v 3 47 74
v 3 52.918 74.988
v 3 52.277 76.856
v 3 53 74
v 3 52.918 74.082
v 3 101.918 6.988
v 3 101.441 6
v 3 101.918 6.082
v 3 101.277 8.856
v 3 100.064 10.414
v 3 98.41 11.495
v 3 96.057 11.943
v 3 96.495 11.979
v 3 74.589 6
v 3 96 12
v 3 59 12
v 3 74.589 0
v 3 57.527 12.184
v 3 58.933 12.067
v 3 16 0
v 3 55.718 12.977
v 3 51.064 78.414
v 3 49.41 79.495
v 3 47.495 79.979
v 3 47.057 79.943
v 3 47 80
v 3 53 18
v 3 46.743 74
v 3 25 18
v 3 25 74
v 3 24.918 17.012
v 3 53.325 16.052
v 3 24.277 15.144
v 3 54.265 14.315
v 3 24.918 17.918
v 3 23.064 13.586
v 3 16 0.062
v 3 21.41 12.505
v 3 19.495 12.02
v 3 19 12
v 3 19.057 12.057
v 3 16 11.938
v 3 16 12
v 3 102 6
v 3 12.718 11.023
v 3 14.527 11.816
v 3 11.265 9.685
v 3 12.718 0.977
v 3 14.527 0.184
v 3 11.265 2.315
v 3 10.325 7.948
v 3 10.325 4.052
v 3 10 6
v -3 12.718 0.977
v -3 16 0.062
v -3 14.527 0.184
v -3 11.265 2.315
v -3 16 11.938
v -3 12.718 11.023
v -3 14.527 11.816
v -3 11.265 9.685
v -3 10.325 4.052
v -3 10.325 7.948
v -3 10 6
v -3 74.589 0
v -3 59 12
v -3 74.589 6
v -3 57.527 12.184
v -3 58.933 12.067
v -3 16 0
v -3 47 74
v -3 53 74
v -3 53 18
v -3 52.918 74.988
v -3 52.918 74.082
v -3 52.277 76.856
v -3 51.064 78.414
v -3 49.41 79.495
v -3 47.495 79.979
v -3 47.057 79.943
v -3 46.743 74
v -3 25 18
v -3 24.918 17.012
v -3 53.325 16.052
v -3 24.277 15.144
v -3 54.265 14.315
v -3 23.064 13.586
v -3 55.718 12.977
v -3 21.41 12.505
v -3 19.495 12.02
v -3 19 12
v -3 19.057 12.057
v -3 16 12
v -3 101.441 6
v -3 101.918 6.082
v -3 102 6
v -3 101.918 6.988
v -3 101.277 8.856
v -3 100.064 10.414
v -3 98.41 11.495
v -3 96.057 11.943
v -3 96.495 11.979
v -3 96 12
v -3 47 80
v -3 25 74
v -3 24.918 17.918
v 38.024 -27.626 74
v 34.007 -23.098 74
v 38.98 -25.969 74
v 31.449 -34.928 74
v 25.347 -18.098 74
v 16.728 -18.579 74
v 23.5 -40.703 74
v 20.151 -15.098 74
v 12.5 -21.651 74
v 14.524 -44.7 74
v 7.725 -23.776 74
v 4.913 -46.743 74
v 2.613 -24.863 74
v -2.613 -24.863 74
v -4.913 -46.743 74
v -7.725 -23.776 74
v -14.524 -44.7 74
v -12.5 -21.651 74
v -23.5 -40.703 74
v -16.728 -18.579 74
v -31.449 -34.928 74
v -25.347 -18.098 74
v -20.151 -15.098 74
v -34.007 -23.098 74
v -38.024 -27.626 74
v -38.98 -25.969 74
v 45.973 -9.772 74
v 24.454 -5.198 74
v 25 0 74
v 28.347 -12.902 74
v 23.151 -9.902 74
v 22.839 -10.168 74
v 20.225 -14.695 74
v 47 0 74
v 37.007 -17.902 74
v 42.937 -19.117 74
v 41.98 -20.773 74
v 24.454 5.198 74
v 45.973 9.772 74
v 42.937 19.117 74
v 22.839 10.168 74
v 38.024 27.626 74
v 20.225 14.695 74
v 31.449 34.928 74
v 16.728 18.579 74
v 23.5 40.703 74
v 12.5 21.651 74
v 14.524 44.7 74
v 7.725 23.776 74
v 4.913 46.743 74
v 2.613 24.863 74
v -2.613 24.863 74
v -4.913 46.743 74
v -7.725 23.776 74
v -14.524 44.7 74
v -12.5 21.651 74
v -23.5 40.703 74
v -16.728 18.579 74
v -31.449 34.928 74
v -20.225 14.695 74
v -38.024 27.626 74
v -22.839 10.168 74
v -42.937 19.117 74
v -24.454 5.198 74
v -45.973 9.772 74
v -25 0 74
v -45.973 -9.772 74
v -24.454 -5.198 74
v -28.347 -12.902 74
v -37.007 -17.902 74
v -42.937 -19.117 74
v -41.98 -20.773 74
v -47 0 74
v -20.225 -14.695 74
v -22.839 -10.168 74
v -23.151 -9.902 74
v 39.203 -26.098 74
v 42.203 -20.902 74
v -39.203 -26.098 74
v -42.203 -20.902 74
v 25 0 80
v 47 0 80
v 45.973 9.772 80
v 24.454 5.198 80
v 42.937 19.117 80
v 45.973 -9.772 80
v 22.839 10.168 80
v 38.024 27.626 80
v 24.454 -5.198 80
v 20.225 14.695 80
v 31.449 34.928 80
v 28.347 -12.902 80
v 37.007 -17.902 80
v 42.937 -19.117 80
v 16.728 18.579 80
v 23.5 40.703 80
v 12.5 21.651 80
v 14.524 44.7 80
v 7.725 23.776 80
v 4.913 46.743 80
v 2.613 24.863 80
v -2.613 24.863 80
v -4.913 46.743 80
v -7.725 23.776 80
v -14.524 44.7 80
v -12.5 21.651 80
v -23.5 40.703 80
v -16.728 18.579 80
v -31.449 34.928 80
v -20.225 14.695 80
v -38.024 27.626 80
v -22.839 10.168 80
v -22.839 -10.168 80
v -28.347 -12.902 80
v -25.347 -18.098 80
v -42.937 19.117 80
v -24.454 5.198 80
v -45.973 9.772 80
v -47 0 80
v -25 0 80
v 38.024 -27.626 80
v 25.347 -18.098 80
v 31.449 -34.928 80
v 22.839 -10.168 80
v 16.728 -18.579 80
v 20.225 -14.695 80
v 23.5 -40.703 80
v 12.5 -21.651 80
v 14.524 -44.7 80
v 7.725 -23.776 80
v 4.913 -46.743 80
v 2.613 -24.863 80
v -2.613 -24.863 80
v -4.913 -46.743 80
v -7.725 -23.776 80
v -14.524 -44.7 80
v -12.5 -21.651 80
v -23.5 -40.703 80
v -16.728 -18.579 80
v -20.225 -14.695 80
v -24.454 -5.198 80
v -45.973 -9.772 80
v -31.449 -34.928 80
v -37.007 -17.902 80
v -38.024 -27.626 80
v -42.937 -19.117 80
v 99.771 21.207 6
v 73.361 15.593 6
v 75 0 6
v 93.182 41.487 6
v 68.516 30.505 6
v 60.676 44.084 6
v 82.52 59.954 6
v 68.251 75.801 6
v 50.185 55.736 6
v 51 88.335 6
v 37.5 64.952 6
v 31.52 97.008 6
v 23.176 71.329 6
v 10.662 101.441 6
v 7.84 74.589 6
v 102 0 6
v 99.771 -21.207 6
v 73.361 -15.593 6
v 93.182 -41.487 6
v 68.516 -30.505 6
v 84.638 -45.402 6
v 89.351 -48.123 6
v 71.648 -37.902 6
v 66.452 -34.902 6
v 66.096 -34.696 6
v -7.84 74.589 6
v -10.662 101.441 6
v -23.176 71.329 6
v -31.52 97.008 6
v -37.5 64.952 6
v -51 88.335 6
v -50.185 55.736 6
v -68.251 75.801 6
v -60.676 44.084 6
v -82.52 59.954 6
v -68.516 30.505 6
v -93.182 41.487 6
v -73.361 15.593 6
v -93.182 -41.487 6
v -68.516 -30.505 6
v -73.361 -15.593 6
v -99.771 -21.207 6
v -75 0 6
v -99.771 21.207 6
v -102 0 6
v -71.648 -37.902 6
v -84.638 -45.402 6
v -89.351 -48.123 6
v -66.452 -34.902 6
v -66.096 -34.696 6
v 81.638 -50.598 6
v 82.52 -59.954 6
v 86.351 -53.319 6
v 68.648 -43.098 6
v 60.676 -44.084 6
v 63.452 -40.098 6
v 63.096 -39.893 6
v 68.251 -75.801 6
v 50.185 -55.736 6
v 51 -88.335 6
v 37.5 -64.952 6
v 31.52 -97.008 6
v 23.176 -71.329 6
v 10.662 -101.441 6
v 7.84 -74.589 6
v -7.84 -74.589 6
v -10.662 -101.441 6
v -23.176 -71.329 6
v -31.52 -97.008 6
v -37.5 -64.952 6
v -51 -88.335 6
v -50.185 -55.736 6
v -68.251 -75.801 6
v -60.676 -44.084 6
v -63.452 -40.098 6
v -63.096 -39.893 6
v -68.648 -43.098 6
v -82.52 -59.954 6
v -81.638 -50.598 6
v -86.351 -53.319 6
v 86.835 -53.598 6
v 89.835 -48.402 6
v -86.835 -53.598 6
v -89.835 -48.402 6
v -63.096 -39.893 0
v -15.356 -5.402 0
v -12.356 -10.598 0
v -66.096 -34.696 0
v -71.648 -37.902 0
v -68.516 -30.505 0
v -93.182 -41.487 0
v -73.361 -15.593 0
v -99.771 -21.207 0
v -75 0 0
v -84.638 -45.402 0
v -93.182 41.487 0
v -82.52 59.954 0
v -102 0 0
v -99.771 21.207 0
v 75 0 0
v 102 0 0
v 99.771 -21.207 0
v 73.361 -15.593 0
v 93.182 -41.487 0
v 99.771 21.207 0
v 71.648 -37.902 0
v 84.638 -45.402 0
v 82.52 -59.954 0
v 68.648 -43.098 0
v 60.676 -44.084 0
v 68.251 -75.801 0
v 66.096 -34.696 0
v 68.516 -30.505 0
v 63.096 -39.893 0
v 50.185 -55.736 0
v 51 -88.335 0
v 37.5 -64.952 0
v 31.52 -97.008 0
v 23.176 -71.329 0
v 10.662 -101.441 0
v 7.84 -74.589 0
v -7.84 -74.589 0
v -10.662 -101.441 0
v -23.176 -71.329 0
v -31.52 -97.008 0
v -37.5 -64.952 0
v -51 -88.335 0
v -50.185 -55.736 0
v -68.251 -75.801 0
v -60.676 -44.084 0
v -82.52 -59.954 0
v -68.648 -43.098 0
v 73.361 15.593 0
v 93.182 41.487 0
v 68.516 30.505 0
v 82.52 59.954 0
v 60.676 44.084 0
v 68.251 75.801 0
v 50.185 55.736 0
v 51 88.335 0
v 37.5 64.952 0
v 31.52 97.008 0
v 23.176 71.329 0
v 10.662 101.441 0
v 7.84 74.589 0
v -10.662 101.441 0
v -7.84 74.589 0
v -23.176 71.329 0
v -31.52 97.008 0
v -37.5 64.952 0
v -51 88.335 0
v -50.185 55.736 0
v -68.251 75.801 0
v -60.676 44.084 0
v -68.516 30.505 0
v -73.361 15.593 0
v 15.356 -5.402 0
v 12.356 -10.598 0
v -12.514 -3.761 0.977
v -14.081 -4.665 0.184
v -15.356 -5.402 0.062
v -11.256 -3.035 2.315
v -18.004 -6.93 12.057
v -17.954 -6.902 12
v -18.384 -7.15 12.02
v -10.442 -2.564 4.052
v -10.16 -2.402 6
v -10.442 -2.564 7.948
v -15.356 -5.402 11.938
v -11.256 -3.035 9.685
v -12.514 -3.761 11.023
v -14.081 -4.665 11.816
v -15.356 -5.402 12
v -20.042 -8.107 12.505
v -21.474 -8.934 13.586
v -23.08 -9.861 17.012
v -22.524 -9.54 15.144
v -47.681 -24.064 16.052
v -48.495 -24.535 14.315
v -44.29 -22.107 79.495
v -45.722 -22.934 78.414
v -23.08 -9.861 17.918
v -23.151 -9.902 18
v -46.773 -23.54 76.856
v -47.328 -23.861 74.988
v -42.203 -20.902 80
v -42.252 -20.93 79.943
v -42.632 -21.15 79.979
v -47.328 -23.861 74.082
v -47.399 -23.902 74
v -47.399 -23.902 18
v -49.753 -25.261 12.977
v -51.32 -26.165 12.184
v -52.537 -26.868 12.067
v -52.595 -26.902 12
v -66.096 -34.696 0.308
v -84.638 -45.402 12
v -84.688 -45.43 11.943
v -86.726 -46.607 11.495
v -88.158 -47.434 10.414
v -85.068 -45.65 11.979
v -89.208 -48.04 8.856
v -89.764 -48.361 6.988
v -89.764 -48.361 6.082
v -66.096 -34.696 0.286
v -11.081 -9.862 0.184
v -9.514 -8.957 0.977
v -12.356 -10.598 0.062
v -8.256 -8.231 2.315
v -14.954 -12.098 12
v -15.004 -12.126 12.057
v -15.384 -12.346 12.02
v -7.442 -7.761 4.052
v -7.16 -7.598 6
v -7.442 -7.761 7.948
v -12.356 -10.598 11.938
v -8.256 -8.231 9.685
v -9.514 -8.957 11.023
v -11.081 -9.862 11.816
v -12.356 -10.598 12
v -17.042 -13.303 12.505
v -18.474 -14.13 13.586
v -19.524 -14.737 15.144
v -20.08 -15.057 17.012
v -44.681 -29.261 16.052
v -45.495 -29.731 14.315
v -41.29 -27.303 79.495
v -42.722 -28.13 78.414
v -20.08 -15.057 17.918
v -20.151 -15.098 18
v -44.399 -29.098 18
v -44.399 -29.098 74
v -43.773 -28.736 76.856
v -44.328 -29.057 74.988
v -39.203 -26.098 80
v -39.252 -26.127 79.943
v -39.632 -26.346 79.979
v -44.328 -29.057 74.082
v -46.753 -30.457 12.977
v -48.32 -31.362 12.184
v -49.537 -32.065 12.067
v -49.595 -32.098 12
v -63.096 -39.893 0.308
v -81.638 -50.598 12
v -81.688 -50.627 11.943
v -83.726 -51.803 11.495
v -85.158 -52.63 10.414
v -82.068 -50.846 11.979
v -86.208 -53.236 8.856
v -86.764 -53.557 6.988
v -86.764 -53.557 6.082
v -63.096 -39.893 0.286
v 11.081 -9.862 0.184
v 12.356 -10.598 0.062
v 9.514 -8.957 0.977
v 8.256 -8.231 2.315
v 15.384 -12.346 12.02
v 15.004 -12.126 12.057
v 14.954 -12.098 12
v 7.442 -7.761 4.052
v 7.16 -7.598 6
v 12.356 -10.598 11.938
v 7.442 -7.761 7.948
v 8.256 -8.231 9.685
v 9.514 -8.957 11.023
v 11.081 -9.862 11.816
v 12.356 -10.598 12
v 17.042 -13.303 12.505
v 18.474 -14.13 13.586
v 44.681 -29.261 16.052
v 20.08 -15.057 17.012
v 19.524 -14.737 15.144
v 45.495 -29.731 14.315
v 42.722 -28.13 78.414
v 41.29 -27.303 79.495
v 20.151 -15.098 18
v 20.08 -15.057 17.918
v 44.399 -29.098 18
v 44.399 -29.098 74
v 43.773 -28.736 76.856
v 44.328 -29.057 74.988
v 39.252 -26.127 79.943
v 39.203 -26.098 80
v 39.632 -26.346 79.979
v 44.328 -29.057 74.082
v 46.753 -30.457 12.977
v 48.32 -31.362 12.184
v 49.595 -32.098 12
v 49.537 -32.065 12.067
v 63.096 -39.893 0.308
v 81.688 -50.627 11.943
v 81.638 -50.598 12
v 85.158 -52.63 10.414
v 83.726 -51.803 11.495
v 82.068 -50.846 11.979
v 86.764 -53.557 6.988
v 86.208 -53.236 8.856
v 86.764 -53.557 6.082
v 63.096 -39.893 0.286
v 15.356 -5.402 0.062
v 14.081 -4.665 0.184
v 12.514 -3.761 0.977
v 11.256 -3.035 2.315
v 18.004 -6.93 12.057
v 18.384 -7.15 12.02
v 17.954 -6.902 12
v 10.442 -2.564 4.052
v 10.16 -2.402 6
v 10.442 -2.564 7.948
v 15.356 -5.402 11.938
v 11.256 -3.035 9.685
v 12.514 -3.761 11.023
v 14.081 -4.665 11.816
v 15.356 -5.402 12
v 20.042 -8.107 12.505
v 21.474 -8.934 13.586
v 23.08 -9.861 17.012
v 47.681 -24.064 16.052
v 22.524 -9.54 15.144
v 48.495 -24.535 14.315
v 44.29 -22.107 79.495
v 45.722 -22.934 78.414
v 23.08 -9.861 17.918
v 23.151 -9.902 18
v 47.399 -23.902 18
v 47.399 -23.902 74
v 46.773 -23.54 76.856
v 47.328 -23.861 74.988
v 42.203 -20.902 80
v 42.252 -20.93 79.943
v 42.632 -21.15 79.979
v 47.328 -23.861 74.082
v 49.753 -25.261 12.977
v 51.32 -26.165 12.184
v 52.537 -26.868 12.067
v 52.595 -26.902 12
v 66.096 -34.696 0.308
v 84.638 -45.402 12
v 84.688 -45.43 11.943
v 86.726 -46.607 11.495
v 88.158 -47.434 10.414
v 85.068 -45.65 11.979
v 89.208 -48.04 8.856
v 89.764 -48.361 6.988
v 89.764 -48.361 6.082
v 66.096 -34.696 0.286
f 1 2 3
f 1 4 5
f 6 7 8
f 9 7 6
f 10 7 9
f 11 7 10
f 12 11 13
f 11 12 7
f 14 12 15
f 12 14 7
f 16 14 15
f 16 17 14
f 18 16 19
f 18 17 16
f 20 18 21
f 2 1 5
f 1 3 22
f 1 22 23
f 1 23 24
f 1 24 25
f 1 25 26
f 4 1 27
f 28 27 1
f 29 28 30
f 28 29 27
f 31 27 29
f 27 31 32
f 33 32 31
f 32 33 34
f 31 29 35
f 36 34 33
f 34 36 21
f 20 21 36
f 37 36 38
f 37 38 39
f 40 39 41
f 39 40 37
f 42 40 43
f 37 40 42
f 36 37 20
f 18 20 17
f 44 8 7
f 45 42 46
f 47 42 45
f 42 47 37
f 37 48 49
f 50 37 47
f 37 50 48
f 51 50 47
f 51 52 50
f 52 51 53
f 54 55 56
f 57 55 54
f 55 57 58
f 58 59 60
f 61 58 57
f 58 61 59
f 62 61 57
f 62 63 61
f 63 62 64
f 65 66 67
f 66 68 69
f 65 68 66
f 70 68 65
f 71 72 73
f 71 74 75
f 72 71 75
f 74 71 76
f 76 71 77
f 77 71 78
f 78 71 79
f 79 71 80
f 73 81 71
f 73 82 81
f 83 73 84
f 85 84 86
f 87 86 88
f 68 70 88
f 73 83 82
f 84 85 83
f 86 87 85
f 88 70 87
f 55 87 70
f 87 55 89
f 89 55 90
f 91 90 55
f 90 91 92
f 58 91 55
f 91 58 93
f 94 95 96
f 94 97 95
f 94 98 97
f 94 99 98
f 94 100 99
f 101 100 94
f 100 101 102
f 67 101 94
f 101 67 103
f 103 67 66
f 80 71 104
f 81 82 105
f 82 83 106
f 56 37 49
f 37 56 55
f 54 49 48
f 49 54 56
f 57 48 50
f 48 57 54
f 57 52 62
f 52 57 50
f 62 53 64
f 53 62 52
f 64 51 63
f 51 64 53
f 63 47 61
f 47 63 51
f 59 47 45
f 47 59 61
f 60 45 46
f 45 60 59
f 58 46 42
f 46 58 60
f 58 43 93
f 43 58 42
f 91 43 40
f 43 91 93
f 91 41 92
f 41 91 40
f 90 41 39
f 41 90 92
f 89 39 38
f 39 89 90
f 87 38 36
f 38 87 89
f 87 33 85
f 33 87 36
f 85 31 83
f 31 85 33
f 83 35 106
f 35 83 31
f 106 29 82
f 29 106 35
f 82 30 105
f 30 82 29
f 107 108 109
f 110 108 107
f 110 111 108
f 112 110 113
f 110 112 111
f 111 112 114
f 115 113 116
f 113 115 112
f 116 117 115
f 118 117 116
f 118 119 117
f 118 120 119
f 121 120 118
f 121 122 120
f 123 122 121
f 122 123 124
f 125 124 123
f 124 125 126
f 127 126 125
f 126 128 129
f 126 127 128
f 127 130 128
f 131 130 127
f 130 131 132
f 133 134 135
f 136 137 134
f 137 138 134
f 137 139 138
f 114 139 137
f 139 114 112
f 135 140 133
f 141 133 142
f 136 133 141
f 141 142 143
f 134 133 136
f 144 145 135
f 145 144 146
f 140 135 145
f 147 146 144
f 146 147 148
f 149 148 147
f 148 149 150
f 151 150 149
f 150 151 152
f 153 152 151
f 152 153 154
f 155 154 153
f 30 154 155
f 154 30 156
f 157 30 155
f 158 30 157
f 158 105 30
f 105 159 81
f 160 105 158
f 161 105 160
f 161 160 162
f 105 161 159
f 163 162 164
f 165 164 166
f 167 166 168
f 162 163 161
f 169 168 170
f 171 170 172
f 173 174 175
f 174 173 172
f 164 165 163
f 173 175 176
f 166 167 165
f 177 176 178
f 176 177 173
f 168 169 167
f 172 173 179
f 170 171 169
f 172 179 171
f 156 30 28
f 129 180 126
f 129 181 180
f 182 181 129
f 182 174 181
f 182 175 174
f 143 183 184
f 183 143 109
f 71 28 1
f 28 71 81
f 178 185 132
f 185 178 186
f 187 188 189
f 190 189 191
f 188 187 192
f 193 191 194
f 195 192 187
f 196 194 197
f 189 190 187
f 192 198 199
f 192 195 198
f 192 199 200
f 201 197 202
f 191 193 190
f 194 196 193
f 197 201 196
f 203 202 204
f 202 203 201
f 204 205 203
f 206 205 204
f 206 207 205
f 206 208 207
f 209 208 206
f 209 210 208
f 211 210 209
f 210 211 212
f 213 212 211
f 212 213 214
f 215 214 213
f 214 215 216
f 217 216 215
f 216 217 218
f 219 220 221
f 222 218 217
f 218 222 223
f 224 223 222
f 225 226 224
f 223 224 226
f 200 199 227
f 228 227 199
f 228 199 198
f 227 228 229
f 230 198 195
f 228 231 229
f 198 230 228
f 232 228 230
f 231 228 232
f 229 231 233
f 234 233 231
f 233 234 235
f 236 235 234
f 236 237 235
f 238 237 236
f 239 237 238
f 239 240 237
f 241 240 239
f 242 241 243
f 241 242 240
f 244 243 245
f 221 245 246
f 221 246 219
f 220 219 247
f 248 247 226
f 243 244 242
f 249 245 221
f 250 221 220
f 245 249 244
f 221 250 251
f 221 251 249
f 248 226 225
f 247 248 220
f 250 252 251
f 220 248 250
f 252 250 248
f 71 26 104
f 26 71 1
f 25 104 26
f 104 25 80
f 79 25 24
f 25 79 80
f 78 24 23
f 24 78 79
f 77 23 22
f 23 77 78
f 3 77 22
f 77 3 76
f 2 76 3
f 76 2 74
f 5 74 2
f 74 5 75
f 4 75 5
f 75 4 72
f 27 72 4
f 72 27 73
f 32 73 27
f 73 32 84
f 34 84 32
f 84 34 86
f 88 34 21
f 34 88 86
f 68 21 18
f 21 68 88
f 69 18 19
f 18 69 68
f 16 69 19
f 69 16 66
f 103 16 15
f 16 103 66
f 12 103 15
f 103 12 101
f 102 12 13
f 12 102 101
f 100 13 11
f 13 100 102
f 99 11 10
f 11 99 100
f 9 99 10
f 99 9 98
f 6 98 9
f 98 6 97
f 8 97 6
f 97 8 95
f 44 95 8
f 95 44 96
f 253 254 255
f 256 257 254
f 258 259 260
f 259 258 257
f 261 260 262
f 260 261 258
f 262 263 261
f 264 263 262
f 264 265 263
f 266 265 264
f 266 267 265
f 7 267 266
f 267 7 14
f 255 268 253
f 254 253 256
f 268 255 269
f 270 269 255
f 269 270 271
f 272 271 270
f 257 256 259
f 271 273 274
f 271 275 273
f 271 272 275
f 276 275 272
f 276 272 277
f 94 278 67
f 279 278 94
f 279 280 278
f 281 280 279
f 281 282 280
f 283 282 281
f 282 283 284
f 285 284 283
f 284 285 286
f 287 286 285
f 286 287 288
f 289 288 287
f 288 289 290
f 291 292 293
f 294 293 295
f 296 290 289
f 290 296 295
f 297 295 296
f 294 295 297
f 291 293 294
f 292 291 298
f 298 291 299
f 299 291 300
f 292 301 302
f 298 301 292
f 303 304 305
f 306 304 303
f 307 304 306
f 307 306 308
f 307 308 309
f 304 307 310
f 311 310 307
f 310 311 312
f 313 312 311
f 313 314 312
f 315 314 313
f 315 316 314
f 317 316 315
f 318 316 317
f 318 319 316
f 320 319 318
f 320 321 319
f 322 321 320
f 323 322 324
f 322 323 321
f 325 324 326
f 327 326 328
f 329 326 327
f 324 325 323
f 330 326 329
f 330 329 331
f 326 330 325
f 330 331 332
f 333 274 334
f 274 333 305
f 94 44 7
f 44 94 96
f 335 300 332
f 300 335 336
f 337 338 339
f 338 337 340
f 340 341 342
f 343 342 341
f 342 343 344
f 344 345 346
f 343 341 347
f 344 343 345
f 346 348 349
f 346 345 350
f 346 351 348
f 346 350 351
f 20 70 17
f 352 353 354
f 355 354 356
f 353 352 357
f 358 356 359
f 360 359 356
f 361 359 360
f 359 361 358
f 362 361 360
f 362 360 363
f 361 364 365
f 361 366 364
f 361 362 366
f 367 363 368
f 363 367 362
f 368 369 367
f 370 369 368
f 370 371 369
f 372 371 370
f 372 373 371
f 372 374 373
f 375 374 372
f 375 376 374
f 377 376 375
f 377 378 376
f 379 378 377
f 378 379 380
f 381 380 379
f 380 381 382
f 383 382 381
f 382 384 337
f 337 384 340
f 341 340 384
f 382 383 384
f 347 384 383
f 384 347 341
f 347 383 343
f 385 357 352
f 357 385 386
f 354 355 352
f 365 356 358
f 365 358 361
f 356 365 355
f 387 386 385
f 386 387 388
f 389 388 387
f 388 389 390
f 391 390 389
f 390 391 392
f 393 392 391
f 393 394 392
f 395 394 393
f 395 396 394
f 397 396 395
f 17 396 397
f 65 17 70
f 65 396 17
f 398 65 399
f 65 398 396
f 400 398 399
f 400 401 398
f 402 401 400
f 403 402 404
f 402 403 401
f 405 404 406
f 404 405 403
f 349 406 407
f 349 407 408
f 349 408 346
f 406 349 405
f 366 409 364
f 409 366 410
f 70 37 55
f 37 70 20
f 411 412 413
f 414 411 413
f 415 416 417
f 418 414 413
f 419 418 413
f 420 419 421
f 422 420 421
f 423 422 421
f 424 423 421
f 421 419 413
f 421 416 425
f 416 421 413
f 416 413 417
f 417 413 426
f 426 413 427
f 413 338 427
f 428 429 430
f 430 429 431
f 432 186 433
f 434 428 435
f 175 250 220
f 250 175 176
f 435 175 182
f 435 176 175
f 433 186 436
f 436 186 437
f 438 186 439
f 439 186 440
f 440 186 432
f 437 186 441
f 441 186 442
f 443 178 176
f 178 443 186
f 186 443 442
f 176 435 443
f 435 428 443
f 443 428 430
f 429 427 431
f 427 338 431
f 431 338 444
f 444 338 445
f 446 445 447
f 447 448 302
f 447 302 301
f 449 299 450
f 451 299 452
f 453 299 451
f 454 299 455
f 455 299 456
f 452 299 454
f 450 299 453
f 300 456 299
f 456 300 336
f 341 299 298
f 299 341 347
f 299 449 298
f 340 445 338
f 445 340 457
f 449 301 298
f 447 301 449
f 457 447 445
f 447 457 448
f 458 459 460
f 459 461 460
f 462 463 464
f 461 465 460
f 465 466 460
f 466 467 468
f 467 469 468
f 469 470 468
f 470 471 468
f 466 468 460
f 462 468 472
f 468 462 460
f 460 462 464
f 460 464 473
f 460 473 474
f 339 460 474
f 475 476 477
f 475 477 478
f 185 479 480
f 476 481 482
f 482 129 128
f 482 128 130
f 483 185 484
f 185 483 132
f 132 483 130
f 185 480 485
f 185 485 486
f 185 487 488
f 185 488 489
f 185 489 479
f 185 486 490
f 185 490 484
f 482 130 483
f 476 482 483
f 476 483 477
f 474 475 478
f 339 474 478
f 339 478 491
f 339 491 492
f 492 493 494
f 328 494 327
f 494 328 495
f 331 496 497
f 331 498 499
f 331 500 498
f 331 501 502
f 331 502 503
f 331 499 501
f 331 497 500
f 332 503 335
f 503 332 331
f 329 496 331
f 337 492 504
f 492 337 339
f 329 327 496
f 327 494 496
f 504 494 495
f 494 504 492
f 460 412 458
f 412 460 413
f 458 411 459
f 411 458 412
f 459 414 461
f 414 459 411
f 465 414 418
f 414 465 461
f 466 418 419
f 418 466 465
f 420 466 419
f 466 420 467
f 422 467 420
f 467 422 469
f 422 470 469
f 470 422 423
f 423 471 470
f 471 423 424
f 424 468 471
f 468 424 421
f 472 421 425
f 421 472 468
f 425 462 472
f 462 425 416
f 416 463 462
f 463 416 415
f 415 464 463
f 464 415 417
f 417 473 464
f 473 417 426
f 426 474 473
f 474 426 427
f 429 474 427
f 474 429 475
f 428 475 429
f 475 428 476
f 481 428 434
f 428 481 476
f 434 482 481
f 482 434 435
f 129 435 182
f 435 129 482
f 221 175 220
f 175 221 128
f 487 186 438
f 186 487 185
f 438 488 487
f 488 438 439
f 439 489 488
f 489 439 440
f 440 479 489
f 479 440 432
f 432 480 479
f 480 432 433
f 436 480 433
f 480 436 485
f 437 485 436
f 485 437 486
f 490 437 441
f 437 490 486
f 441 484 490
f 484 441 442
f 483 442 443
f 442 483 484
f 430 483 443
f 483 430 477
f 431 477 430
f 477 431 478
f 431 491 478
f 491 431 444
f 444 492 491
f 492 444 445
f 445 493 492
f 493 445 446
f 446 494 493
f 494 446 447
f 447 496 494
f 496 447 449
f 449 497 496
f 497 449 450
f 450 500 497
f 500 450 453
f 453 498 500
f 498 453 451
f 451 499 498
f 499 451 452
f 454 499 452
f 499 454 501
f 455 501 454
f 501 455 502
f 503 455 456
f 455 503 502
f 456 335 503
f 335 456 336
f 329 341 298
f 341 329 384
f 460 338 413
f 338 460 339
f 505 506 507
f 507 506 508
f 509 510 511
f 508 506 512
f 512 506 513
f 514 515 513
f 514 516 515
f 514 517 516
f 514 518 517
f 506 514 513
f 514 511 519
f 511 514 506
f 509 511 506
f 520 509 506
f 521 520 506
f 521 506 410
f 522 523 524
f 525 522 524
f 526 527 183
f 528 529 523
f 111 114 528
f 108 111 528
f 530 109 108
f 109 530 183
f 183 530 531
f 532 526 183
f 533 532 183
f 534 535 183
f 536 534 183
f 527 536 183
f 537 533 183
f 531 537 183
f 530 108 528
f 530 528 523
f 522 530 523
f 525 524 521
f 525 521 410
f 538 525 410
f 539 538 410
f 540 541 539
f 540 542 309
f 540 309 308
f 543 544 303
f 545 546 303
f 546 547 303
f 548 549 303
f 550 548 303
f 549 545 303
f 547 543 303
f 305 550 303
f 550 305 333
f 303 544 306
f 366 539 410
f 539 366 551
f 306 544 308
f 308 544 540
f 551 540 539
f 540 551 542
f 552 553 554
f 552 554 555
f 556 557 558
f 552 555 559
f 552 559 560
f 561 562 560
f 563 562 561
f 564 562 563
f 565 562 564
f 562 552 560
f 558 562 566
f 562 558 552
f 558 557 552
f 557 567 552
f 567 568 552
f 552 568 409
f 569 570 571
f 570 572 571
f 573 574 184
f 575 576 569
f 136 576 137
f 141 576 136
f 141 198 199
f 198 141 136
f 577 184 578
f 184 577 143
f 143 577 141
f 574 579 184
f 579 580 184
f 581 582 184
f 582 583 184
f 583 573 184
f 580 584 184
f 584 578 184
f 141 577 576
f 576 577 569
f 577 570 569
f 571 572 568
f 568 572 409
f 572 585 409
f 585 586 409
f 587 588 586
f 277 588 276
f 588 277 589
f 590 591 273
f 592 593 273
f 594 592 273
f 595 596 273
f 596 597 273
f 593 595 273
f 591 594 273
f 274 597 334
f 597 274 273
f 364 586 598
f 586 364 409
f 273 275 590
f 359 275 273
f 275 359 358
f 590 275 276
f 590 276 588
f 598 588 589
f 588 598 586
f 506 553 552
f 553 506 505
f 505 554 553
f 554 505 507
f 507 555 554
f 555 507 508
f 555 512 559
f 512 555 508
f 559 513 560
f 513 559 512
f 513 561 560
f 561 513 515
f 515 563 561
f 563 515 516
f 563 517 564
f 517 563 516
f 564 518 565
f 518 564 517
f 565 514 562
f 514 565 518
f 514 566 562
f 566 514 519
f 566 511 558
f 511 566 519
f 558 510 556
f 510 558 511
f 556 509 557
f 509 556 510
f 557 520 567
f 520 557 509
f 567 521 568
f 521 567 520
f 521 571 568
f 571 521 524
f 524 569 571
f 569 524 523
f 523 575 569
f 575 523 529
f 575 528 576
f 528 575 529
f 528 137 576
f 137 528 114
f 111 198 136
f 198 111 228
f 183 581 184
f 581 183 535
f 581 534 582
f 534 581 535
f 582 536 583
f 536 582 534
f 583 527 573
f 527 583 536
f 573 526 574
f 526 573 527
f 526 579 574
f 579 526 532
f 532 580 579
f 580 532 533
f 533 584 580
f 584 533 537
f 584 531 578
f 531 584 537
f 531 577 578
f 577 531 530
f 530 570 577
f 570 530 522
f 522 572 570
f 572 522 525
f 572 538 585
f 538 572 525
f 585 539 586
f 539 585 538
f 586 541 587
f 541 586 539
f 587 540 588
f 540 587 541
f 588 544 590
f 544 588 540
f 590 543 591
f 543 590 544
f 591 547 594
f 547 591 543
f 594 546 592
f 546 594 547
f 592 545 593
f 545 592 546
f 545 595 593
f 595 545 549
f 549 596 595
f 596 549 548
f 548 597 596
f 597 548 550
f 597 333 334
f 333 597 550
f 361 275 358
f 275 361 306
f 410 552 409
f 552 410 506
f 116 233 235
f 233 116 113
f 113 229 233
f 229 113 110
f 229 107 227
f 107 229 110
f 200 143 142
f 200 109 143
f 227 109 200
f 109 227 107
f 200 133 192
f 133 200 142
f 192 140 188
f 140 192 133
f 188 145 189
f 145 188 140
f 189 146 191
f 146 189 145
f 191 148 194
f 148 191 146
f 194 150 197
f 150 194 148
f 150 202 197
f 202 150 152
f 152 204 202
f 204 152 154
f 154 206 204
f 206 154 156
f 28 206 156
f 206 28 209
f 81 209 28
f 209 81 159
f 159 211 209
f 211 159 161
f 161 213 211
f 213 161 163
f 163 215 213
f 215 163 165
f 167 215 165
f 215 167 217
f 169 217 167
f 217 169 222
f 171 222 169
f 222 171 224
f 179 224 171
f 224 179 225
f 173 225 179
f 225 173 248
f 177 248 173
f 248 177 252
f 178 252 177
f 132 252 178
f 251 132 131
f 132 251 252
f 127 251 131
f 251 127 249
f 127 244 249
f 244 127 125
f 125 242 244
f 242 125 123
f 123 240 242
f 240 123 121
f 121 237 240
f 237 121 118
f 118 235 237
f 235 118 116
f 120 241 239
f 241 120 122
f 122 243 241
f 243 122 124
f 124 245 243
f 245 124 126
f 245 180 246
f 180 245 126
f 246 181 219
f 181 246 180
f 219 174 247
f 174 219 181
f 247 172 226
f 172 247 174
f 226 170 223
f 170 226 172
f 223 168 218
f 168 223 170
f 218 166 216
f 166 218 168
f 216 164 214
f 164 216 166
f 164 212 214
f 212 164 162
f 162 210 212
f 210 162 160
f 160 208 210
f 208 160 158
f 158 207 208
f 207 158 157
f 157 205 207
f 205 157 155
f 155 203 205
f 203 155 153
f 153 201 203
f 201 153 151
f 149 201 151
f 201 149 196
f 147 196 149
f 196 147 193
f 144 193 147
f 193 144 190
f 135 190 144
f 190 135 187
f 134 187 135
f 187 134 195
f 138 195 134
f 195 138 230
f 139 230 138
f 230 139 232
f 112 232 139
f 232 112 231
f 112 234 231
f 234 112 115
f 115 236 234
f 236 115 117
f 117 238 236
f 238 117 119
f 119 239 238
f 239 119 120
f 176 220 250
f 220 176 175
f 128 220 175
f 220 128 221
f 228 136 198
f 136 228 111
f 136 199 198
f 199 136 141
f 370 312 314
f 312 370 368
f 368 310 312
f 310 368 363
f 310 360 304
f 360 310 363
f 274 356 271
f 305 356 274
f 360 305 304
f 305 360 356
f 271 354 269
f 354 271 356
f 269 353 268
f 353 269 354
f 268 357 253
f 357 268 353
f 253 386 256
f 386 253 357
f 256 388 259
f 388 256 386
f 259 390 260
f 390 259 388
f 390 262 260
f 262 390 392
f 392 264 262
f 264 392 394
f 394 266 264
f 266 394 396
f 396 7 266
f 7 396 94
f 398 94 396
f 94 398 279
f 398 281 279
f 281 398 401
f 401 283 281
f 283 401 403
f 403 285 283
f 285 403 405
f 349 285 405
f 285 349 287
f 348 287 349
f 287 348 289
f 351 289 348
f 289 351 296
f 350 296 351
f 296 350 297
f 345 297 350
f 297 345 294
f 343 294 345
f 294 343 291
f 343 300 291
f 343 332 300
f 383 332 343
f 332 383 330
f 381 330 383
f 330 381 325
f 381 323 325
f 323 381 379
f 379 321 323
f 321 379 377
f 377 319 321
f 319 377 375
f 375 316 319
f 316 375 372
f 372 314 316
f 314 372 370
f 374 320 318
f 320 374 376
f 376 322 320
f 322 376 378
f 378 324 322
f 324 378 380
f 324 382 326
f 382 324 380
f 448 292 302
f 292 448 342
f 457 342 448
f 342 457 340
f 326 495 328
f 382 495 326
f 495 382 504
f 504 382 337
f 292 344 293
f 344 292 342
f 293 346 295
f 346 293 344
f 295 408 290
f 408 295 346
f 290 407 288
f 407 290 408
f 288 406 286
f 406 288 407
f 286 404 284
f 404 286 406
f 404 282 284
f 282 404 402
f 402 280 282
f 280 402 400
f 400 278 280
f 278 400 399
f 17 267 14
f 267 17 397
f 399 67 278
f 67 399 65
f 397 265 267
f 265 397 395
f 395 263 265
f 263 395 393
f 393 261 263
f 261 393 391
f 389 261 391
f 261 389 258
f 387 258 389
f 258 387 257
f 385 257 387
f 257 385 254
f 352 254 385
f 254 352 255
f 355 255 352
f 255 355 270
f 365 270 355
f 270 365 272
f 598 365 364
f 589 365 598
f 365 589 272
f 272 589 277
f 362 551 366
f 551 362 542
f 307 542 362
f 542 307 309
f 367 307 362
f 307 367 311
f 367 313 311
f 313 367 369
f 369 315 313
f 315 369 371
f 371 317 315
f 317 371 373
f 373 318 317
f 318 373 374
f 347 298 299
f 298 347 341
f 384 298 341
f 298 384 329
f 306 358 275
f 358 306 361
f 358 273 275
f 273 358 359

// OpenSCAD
// To render the DXF file from the command line:
// openscad -o tripod.dxf -D'mode="parts"' example017.scad

// mode = "parts";
// mode = "exploded";
mode = "assembled";

thickness = 6;
locklen1 = 15;
locklen2 = 10;
boltlen = 15;
midhole = 10;
inner1_to_inner2 = 50;
total_height = 80;

echo(version=version());

module shape_tripod()
{
	x1 = 0;
	x2 = x1 + thickness;
	x3 = x2 + locklen1;
	x4 = x3 + thickness;
	x5 = x4 + inner1_to_inner2;
	x6 = x5 - thickness;
	x7 = x6 - locklen2;
	x8 = x7 - thickness;
	x9 = x8 - thickness;
	x10 = x9 - thickness;
	
	y1 = 0;
	y2 = y1 + thickness;
	y3 = y2 + thickness;
	y4 = y3 + thickness;
	y5 = y3 + total_height - 3*thickness;
	y6 = y5 + thickness;
	
	union()
	{
		difference() {
			polygon([
				[ x1, y2 ], [ x2, y2 ],
				[ x2, y1 ], [ x3, y1 ], [ x3, y2 ],
				[ x4, y2 ], [ x4, y1 ], [ x5, y1 ],
				[ x5 + thickness, y3 ], [ x5, y4 ],
				[ x5, y5 ],
				[ x6, y5 ], [ x6, y6 ], [ x7, y6 ], [ x7, y5 ], [ x8, y5 ],
				[ x8, y6 ], [ x9, y5 ],
				[ x9, y4 ], [ x10, y3 ],
				[ x2, y3 ]
			]);
			translate([ x10, y4 ]) circle(thickness);
			translate([ x5 + thickness, y4 ]) circle(thickness);
		}
	
		translate([ x5, y1 ])
		square([ boltlen - thickness, thickness*2 ]);
	
		translate([ x5 + boltlen - thickness, y2 ]) circle(thickness);
	
		translate([ x2, y2 ]) intersection() {
			circle(thickness);
			translate([ -thickness*2, 0 ]) square(thickness*2);
		}
	
		translate([ x8, y5 ]) intersection() {
			circle(thickness);
			translate([ -thickness*2, 0 ]) square(thickness*2);
		}
	}
}

module shape_inner_disc()
{
	difference() {
		circle(midhole + boltlen + 2*thickness + locklen2);
		for (alpha = [ 0, 120, 240 ])
			rotate(alpha) translate([ 0, midhole + boltlen + thickness + locklen2/2 ]) square([ thickness, locklen2 ], true);
		circle(midhole + boltlen);
	}
}

module shape_outer_disc()
{
	difference() {
		circle(midhole + boltlen + inner1_to_inner2 + 2*thickness + locklen1);
		for (alpha = [ 0, 120, 240 ])
			rotate(alpha) translate([ 0, midhole + boltlen + inner1_to_inner2 + thickness + locklen1/2 ]) square([ thickness, locklen1 ], true);
		circle(midhole + boltlen + inner1_to_inner2);
	}
}

module parts()
{
	tripod_x_off = locklen1 - locklen2 + inner1_to_inner2;
	tripod_y_off = max(midhole + boltlen + inner1_to_inner2 + 4*thickness + locklen1, total_height);

	shape_inner_disc();
	shape_outer_disc();

	for (s = [ [1,1], [-1,1], [1,-1] ])
		scale(s) translate([ tripod_x_off, -tripod_y_off ]) shape_tripod();
}

module exploded()
{
	translate([ 0, 0, total_height + 2*thickness ]) linear_extrude(height = thickness, convexity = 4) shape_inner_disc();
	linear_extrude(height = thickness, convexity = 4) shape_outer_disc();

	color([ 0.7, 0.7, 1 ]) for (alpha = [ 0, 120, 240 ])
		rotate(alpha) translate([ 0, thickness*2 + locklen1 + inner1_to_inner2 + boltlen + midhole, 1.5*thickness ])
			rotate([ 90, 0, -90 ]) linear_extrude(height = thickness, convexity = 10, center = true) shape_tripod();
}

module bottle()
{
	r = boltlen + midhole;
	h = total_height - thickness*2;

	rotate_extrude(convexity = 2)
	{
		square([ r, h ]);

		translate([ 0, h ])
		intersection() {
			square([ r, r ]);
			scale([ 1, 0.7 ]) circle(r);
		}

		translate([ 0, h+r ])
		intersection() {
			translate([ 0, -r/2 ]) square([ r/2, r ]);
			circle(r/2);
		}
	}
}

module assembled()
{
	translate([ 0, 0, total_height - thickness ]) linear_extrude(height = thickness, convexity = 4) shape_inner_disc();
	linear_extrude(height = thickness, convexity = 4) shape_outer_disc();

	color([ 0.7, 0.7, 1 ]) for (alpha = [ 0, 120, 240 ])
		rotate(alpha) translate([ 0, thickness*2 + locklen1 + inner1_to_inner2 + boltlen + midhole, 0 ])
			rotate([ 90, 0, -90 ]) linear_extrude(height = thickness, convexity = 10, center = true) shape_tripod();

	% translate([ 0, 0, thickness*2]) bottle();
}

if (mode == "parts")
	parts();

if (mode == "exploded")
	exploded();

if (mode == "assembled")
	assembled();

// Written by Clifford Wolf &ltclifford@clifford.at> and Marius
// Kintel &ltmarius@kintel.net>
//
// To the extent possible under law, the author(s) have dedicated all
// copyright and related and neighboring rights to this software to the
// public domain worldwide. This software is distributed without any
// warranty.
//
// You should have received a copy of the CC0 Public Domain
// Dedication along with this software.
// If not, see &lthttp://creativecommons.org/publicdomain/zero/1.0/&gt.
